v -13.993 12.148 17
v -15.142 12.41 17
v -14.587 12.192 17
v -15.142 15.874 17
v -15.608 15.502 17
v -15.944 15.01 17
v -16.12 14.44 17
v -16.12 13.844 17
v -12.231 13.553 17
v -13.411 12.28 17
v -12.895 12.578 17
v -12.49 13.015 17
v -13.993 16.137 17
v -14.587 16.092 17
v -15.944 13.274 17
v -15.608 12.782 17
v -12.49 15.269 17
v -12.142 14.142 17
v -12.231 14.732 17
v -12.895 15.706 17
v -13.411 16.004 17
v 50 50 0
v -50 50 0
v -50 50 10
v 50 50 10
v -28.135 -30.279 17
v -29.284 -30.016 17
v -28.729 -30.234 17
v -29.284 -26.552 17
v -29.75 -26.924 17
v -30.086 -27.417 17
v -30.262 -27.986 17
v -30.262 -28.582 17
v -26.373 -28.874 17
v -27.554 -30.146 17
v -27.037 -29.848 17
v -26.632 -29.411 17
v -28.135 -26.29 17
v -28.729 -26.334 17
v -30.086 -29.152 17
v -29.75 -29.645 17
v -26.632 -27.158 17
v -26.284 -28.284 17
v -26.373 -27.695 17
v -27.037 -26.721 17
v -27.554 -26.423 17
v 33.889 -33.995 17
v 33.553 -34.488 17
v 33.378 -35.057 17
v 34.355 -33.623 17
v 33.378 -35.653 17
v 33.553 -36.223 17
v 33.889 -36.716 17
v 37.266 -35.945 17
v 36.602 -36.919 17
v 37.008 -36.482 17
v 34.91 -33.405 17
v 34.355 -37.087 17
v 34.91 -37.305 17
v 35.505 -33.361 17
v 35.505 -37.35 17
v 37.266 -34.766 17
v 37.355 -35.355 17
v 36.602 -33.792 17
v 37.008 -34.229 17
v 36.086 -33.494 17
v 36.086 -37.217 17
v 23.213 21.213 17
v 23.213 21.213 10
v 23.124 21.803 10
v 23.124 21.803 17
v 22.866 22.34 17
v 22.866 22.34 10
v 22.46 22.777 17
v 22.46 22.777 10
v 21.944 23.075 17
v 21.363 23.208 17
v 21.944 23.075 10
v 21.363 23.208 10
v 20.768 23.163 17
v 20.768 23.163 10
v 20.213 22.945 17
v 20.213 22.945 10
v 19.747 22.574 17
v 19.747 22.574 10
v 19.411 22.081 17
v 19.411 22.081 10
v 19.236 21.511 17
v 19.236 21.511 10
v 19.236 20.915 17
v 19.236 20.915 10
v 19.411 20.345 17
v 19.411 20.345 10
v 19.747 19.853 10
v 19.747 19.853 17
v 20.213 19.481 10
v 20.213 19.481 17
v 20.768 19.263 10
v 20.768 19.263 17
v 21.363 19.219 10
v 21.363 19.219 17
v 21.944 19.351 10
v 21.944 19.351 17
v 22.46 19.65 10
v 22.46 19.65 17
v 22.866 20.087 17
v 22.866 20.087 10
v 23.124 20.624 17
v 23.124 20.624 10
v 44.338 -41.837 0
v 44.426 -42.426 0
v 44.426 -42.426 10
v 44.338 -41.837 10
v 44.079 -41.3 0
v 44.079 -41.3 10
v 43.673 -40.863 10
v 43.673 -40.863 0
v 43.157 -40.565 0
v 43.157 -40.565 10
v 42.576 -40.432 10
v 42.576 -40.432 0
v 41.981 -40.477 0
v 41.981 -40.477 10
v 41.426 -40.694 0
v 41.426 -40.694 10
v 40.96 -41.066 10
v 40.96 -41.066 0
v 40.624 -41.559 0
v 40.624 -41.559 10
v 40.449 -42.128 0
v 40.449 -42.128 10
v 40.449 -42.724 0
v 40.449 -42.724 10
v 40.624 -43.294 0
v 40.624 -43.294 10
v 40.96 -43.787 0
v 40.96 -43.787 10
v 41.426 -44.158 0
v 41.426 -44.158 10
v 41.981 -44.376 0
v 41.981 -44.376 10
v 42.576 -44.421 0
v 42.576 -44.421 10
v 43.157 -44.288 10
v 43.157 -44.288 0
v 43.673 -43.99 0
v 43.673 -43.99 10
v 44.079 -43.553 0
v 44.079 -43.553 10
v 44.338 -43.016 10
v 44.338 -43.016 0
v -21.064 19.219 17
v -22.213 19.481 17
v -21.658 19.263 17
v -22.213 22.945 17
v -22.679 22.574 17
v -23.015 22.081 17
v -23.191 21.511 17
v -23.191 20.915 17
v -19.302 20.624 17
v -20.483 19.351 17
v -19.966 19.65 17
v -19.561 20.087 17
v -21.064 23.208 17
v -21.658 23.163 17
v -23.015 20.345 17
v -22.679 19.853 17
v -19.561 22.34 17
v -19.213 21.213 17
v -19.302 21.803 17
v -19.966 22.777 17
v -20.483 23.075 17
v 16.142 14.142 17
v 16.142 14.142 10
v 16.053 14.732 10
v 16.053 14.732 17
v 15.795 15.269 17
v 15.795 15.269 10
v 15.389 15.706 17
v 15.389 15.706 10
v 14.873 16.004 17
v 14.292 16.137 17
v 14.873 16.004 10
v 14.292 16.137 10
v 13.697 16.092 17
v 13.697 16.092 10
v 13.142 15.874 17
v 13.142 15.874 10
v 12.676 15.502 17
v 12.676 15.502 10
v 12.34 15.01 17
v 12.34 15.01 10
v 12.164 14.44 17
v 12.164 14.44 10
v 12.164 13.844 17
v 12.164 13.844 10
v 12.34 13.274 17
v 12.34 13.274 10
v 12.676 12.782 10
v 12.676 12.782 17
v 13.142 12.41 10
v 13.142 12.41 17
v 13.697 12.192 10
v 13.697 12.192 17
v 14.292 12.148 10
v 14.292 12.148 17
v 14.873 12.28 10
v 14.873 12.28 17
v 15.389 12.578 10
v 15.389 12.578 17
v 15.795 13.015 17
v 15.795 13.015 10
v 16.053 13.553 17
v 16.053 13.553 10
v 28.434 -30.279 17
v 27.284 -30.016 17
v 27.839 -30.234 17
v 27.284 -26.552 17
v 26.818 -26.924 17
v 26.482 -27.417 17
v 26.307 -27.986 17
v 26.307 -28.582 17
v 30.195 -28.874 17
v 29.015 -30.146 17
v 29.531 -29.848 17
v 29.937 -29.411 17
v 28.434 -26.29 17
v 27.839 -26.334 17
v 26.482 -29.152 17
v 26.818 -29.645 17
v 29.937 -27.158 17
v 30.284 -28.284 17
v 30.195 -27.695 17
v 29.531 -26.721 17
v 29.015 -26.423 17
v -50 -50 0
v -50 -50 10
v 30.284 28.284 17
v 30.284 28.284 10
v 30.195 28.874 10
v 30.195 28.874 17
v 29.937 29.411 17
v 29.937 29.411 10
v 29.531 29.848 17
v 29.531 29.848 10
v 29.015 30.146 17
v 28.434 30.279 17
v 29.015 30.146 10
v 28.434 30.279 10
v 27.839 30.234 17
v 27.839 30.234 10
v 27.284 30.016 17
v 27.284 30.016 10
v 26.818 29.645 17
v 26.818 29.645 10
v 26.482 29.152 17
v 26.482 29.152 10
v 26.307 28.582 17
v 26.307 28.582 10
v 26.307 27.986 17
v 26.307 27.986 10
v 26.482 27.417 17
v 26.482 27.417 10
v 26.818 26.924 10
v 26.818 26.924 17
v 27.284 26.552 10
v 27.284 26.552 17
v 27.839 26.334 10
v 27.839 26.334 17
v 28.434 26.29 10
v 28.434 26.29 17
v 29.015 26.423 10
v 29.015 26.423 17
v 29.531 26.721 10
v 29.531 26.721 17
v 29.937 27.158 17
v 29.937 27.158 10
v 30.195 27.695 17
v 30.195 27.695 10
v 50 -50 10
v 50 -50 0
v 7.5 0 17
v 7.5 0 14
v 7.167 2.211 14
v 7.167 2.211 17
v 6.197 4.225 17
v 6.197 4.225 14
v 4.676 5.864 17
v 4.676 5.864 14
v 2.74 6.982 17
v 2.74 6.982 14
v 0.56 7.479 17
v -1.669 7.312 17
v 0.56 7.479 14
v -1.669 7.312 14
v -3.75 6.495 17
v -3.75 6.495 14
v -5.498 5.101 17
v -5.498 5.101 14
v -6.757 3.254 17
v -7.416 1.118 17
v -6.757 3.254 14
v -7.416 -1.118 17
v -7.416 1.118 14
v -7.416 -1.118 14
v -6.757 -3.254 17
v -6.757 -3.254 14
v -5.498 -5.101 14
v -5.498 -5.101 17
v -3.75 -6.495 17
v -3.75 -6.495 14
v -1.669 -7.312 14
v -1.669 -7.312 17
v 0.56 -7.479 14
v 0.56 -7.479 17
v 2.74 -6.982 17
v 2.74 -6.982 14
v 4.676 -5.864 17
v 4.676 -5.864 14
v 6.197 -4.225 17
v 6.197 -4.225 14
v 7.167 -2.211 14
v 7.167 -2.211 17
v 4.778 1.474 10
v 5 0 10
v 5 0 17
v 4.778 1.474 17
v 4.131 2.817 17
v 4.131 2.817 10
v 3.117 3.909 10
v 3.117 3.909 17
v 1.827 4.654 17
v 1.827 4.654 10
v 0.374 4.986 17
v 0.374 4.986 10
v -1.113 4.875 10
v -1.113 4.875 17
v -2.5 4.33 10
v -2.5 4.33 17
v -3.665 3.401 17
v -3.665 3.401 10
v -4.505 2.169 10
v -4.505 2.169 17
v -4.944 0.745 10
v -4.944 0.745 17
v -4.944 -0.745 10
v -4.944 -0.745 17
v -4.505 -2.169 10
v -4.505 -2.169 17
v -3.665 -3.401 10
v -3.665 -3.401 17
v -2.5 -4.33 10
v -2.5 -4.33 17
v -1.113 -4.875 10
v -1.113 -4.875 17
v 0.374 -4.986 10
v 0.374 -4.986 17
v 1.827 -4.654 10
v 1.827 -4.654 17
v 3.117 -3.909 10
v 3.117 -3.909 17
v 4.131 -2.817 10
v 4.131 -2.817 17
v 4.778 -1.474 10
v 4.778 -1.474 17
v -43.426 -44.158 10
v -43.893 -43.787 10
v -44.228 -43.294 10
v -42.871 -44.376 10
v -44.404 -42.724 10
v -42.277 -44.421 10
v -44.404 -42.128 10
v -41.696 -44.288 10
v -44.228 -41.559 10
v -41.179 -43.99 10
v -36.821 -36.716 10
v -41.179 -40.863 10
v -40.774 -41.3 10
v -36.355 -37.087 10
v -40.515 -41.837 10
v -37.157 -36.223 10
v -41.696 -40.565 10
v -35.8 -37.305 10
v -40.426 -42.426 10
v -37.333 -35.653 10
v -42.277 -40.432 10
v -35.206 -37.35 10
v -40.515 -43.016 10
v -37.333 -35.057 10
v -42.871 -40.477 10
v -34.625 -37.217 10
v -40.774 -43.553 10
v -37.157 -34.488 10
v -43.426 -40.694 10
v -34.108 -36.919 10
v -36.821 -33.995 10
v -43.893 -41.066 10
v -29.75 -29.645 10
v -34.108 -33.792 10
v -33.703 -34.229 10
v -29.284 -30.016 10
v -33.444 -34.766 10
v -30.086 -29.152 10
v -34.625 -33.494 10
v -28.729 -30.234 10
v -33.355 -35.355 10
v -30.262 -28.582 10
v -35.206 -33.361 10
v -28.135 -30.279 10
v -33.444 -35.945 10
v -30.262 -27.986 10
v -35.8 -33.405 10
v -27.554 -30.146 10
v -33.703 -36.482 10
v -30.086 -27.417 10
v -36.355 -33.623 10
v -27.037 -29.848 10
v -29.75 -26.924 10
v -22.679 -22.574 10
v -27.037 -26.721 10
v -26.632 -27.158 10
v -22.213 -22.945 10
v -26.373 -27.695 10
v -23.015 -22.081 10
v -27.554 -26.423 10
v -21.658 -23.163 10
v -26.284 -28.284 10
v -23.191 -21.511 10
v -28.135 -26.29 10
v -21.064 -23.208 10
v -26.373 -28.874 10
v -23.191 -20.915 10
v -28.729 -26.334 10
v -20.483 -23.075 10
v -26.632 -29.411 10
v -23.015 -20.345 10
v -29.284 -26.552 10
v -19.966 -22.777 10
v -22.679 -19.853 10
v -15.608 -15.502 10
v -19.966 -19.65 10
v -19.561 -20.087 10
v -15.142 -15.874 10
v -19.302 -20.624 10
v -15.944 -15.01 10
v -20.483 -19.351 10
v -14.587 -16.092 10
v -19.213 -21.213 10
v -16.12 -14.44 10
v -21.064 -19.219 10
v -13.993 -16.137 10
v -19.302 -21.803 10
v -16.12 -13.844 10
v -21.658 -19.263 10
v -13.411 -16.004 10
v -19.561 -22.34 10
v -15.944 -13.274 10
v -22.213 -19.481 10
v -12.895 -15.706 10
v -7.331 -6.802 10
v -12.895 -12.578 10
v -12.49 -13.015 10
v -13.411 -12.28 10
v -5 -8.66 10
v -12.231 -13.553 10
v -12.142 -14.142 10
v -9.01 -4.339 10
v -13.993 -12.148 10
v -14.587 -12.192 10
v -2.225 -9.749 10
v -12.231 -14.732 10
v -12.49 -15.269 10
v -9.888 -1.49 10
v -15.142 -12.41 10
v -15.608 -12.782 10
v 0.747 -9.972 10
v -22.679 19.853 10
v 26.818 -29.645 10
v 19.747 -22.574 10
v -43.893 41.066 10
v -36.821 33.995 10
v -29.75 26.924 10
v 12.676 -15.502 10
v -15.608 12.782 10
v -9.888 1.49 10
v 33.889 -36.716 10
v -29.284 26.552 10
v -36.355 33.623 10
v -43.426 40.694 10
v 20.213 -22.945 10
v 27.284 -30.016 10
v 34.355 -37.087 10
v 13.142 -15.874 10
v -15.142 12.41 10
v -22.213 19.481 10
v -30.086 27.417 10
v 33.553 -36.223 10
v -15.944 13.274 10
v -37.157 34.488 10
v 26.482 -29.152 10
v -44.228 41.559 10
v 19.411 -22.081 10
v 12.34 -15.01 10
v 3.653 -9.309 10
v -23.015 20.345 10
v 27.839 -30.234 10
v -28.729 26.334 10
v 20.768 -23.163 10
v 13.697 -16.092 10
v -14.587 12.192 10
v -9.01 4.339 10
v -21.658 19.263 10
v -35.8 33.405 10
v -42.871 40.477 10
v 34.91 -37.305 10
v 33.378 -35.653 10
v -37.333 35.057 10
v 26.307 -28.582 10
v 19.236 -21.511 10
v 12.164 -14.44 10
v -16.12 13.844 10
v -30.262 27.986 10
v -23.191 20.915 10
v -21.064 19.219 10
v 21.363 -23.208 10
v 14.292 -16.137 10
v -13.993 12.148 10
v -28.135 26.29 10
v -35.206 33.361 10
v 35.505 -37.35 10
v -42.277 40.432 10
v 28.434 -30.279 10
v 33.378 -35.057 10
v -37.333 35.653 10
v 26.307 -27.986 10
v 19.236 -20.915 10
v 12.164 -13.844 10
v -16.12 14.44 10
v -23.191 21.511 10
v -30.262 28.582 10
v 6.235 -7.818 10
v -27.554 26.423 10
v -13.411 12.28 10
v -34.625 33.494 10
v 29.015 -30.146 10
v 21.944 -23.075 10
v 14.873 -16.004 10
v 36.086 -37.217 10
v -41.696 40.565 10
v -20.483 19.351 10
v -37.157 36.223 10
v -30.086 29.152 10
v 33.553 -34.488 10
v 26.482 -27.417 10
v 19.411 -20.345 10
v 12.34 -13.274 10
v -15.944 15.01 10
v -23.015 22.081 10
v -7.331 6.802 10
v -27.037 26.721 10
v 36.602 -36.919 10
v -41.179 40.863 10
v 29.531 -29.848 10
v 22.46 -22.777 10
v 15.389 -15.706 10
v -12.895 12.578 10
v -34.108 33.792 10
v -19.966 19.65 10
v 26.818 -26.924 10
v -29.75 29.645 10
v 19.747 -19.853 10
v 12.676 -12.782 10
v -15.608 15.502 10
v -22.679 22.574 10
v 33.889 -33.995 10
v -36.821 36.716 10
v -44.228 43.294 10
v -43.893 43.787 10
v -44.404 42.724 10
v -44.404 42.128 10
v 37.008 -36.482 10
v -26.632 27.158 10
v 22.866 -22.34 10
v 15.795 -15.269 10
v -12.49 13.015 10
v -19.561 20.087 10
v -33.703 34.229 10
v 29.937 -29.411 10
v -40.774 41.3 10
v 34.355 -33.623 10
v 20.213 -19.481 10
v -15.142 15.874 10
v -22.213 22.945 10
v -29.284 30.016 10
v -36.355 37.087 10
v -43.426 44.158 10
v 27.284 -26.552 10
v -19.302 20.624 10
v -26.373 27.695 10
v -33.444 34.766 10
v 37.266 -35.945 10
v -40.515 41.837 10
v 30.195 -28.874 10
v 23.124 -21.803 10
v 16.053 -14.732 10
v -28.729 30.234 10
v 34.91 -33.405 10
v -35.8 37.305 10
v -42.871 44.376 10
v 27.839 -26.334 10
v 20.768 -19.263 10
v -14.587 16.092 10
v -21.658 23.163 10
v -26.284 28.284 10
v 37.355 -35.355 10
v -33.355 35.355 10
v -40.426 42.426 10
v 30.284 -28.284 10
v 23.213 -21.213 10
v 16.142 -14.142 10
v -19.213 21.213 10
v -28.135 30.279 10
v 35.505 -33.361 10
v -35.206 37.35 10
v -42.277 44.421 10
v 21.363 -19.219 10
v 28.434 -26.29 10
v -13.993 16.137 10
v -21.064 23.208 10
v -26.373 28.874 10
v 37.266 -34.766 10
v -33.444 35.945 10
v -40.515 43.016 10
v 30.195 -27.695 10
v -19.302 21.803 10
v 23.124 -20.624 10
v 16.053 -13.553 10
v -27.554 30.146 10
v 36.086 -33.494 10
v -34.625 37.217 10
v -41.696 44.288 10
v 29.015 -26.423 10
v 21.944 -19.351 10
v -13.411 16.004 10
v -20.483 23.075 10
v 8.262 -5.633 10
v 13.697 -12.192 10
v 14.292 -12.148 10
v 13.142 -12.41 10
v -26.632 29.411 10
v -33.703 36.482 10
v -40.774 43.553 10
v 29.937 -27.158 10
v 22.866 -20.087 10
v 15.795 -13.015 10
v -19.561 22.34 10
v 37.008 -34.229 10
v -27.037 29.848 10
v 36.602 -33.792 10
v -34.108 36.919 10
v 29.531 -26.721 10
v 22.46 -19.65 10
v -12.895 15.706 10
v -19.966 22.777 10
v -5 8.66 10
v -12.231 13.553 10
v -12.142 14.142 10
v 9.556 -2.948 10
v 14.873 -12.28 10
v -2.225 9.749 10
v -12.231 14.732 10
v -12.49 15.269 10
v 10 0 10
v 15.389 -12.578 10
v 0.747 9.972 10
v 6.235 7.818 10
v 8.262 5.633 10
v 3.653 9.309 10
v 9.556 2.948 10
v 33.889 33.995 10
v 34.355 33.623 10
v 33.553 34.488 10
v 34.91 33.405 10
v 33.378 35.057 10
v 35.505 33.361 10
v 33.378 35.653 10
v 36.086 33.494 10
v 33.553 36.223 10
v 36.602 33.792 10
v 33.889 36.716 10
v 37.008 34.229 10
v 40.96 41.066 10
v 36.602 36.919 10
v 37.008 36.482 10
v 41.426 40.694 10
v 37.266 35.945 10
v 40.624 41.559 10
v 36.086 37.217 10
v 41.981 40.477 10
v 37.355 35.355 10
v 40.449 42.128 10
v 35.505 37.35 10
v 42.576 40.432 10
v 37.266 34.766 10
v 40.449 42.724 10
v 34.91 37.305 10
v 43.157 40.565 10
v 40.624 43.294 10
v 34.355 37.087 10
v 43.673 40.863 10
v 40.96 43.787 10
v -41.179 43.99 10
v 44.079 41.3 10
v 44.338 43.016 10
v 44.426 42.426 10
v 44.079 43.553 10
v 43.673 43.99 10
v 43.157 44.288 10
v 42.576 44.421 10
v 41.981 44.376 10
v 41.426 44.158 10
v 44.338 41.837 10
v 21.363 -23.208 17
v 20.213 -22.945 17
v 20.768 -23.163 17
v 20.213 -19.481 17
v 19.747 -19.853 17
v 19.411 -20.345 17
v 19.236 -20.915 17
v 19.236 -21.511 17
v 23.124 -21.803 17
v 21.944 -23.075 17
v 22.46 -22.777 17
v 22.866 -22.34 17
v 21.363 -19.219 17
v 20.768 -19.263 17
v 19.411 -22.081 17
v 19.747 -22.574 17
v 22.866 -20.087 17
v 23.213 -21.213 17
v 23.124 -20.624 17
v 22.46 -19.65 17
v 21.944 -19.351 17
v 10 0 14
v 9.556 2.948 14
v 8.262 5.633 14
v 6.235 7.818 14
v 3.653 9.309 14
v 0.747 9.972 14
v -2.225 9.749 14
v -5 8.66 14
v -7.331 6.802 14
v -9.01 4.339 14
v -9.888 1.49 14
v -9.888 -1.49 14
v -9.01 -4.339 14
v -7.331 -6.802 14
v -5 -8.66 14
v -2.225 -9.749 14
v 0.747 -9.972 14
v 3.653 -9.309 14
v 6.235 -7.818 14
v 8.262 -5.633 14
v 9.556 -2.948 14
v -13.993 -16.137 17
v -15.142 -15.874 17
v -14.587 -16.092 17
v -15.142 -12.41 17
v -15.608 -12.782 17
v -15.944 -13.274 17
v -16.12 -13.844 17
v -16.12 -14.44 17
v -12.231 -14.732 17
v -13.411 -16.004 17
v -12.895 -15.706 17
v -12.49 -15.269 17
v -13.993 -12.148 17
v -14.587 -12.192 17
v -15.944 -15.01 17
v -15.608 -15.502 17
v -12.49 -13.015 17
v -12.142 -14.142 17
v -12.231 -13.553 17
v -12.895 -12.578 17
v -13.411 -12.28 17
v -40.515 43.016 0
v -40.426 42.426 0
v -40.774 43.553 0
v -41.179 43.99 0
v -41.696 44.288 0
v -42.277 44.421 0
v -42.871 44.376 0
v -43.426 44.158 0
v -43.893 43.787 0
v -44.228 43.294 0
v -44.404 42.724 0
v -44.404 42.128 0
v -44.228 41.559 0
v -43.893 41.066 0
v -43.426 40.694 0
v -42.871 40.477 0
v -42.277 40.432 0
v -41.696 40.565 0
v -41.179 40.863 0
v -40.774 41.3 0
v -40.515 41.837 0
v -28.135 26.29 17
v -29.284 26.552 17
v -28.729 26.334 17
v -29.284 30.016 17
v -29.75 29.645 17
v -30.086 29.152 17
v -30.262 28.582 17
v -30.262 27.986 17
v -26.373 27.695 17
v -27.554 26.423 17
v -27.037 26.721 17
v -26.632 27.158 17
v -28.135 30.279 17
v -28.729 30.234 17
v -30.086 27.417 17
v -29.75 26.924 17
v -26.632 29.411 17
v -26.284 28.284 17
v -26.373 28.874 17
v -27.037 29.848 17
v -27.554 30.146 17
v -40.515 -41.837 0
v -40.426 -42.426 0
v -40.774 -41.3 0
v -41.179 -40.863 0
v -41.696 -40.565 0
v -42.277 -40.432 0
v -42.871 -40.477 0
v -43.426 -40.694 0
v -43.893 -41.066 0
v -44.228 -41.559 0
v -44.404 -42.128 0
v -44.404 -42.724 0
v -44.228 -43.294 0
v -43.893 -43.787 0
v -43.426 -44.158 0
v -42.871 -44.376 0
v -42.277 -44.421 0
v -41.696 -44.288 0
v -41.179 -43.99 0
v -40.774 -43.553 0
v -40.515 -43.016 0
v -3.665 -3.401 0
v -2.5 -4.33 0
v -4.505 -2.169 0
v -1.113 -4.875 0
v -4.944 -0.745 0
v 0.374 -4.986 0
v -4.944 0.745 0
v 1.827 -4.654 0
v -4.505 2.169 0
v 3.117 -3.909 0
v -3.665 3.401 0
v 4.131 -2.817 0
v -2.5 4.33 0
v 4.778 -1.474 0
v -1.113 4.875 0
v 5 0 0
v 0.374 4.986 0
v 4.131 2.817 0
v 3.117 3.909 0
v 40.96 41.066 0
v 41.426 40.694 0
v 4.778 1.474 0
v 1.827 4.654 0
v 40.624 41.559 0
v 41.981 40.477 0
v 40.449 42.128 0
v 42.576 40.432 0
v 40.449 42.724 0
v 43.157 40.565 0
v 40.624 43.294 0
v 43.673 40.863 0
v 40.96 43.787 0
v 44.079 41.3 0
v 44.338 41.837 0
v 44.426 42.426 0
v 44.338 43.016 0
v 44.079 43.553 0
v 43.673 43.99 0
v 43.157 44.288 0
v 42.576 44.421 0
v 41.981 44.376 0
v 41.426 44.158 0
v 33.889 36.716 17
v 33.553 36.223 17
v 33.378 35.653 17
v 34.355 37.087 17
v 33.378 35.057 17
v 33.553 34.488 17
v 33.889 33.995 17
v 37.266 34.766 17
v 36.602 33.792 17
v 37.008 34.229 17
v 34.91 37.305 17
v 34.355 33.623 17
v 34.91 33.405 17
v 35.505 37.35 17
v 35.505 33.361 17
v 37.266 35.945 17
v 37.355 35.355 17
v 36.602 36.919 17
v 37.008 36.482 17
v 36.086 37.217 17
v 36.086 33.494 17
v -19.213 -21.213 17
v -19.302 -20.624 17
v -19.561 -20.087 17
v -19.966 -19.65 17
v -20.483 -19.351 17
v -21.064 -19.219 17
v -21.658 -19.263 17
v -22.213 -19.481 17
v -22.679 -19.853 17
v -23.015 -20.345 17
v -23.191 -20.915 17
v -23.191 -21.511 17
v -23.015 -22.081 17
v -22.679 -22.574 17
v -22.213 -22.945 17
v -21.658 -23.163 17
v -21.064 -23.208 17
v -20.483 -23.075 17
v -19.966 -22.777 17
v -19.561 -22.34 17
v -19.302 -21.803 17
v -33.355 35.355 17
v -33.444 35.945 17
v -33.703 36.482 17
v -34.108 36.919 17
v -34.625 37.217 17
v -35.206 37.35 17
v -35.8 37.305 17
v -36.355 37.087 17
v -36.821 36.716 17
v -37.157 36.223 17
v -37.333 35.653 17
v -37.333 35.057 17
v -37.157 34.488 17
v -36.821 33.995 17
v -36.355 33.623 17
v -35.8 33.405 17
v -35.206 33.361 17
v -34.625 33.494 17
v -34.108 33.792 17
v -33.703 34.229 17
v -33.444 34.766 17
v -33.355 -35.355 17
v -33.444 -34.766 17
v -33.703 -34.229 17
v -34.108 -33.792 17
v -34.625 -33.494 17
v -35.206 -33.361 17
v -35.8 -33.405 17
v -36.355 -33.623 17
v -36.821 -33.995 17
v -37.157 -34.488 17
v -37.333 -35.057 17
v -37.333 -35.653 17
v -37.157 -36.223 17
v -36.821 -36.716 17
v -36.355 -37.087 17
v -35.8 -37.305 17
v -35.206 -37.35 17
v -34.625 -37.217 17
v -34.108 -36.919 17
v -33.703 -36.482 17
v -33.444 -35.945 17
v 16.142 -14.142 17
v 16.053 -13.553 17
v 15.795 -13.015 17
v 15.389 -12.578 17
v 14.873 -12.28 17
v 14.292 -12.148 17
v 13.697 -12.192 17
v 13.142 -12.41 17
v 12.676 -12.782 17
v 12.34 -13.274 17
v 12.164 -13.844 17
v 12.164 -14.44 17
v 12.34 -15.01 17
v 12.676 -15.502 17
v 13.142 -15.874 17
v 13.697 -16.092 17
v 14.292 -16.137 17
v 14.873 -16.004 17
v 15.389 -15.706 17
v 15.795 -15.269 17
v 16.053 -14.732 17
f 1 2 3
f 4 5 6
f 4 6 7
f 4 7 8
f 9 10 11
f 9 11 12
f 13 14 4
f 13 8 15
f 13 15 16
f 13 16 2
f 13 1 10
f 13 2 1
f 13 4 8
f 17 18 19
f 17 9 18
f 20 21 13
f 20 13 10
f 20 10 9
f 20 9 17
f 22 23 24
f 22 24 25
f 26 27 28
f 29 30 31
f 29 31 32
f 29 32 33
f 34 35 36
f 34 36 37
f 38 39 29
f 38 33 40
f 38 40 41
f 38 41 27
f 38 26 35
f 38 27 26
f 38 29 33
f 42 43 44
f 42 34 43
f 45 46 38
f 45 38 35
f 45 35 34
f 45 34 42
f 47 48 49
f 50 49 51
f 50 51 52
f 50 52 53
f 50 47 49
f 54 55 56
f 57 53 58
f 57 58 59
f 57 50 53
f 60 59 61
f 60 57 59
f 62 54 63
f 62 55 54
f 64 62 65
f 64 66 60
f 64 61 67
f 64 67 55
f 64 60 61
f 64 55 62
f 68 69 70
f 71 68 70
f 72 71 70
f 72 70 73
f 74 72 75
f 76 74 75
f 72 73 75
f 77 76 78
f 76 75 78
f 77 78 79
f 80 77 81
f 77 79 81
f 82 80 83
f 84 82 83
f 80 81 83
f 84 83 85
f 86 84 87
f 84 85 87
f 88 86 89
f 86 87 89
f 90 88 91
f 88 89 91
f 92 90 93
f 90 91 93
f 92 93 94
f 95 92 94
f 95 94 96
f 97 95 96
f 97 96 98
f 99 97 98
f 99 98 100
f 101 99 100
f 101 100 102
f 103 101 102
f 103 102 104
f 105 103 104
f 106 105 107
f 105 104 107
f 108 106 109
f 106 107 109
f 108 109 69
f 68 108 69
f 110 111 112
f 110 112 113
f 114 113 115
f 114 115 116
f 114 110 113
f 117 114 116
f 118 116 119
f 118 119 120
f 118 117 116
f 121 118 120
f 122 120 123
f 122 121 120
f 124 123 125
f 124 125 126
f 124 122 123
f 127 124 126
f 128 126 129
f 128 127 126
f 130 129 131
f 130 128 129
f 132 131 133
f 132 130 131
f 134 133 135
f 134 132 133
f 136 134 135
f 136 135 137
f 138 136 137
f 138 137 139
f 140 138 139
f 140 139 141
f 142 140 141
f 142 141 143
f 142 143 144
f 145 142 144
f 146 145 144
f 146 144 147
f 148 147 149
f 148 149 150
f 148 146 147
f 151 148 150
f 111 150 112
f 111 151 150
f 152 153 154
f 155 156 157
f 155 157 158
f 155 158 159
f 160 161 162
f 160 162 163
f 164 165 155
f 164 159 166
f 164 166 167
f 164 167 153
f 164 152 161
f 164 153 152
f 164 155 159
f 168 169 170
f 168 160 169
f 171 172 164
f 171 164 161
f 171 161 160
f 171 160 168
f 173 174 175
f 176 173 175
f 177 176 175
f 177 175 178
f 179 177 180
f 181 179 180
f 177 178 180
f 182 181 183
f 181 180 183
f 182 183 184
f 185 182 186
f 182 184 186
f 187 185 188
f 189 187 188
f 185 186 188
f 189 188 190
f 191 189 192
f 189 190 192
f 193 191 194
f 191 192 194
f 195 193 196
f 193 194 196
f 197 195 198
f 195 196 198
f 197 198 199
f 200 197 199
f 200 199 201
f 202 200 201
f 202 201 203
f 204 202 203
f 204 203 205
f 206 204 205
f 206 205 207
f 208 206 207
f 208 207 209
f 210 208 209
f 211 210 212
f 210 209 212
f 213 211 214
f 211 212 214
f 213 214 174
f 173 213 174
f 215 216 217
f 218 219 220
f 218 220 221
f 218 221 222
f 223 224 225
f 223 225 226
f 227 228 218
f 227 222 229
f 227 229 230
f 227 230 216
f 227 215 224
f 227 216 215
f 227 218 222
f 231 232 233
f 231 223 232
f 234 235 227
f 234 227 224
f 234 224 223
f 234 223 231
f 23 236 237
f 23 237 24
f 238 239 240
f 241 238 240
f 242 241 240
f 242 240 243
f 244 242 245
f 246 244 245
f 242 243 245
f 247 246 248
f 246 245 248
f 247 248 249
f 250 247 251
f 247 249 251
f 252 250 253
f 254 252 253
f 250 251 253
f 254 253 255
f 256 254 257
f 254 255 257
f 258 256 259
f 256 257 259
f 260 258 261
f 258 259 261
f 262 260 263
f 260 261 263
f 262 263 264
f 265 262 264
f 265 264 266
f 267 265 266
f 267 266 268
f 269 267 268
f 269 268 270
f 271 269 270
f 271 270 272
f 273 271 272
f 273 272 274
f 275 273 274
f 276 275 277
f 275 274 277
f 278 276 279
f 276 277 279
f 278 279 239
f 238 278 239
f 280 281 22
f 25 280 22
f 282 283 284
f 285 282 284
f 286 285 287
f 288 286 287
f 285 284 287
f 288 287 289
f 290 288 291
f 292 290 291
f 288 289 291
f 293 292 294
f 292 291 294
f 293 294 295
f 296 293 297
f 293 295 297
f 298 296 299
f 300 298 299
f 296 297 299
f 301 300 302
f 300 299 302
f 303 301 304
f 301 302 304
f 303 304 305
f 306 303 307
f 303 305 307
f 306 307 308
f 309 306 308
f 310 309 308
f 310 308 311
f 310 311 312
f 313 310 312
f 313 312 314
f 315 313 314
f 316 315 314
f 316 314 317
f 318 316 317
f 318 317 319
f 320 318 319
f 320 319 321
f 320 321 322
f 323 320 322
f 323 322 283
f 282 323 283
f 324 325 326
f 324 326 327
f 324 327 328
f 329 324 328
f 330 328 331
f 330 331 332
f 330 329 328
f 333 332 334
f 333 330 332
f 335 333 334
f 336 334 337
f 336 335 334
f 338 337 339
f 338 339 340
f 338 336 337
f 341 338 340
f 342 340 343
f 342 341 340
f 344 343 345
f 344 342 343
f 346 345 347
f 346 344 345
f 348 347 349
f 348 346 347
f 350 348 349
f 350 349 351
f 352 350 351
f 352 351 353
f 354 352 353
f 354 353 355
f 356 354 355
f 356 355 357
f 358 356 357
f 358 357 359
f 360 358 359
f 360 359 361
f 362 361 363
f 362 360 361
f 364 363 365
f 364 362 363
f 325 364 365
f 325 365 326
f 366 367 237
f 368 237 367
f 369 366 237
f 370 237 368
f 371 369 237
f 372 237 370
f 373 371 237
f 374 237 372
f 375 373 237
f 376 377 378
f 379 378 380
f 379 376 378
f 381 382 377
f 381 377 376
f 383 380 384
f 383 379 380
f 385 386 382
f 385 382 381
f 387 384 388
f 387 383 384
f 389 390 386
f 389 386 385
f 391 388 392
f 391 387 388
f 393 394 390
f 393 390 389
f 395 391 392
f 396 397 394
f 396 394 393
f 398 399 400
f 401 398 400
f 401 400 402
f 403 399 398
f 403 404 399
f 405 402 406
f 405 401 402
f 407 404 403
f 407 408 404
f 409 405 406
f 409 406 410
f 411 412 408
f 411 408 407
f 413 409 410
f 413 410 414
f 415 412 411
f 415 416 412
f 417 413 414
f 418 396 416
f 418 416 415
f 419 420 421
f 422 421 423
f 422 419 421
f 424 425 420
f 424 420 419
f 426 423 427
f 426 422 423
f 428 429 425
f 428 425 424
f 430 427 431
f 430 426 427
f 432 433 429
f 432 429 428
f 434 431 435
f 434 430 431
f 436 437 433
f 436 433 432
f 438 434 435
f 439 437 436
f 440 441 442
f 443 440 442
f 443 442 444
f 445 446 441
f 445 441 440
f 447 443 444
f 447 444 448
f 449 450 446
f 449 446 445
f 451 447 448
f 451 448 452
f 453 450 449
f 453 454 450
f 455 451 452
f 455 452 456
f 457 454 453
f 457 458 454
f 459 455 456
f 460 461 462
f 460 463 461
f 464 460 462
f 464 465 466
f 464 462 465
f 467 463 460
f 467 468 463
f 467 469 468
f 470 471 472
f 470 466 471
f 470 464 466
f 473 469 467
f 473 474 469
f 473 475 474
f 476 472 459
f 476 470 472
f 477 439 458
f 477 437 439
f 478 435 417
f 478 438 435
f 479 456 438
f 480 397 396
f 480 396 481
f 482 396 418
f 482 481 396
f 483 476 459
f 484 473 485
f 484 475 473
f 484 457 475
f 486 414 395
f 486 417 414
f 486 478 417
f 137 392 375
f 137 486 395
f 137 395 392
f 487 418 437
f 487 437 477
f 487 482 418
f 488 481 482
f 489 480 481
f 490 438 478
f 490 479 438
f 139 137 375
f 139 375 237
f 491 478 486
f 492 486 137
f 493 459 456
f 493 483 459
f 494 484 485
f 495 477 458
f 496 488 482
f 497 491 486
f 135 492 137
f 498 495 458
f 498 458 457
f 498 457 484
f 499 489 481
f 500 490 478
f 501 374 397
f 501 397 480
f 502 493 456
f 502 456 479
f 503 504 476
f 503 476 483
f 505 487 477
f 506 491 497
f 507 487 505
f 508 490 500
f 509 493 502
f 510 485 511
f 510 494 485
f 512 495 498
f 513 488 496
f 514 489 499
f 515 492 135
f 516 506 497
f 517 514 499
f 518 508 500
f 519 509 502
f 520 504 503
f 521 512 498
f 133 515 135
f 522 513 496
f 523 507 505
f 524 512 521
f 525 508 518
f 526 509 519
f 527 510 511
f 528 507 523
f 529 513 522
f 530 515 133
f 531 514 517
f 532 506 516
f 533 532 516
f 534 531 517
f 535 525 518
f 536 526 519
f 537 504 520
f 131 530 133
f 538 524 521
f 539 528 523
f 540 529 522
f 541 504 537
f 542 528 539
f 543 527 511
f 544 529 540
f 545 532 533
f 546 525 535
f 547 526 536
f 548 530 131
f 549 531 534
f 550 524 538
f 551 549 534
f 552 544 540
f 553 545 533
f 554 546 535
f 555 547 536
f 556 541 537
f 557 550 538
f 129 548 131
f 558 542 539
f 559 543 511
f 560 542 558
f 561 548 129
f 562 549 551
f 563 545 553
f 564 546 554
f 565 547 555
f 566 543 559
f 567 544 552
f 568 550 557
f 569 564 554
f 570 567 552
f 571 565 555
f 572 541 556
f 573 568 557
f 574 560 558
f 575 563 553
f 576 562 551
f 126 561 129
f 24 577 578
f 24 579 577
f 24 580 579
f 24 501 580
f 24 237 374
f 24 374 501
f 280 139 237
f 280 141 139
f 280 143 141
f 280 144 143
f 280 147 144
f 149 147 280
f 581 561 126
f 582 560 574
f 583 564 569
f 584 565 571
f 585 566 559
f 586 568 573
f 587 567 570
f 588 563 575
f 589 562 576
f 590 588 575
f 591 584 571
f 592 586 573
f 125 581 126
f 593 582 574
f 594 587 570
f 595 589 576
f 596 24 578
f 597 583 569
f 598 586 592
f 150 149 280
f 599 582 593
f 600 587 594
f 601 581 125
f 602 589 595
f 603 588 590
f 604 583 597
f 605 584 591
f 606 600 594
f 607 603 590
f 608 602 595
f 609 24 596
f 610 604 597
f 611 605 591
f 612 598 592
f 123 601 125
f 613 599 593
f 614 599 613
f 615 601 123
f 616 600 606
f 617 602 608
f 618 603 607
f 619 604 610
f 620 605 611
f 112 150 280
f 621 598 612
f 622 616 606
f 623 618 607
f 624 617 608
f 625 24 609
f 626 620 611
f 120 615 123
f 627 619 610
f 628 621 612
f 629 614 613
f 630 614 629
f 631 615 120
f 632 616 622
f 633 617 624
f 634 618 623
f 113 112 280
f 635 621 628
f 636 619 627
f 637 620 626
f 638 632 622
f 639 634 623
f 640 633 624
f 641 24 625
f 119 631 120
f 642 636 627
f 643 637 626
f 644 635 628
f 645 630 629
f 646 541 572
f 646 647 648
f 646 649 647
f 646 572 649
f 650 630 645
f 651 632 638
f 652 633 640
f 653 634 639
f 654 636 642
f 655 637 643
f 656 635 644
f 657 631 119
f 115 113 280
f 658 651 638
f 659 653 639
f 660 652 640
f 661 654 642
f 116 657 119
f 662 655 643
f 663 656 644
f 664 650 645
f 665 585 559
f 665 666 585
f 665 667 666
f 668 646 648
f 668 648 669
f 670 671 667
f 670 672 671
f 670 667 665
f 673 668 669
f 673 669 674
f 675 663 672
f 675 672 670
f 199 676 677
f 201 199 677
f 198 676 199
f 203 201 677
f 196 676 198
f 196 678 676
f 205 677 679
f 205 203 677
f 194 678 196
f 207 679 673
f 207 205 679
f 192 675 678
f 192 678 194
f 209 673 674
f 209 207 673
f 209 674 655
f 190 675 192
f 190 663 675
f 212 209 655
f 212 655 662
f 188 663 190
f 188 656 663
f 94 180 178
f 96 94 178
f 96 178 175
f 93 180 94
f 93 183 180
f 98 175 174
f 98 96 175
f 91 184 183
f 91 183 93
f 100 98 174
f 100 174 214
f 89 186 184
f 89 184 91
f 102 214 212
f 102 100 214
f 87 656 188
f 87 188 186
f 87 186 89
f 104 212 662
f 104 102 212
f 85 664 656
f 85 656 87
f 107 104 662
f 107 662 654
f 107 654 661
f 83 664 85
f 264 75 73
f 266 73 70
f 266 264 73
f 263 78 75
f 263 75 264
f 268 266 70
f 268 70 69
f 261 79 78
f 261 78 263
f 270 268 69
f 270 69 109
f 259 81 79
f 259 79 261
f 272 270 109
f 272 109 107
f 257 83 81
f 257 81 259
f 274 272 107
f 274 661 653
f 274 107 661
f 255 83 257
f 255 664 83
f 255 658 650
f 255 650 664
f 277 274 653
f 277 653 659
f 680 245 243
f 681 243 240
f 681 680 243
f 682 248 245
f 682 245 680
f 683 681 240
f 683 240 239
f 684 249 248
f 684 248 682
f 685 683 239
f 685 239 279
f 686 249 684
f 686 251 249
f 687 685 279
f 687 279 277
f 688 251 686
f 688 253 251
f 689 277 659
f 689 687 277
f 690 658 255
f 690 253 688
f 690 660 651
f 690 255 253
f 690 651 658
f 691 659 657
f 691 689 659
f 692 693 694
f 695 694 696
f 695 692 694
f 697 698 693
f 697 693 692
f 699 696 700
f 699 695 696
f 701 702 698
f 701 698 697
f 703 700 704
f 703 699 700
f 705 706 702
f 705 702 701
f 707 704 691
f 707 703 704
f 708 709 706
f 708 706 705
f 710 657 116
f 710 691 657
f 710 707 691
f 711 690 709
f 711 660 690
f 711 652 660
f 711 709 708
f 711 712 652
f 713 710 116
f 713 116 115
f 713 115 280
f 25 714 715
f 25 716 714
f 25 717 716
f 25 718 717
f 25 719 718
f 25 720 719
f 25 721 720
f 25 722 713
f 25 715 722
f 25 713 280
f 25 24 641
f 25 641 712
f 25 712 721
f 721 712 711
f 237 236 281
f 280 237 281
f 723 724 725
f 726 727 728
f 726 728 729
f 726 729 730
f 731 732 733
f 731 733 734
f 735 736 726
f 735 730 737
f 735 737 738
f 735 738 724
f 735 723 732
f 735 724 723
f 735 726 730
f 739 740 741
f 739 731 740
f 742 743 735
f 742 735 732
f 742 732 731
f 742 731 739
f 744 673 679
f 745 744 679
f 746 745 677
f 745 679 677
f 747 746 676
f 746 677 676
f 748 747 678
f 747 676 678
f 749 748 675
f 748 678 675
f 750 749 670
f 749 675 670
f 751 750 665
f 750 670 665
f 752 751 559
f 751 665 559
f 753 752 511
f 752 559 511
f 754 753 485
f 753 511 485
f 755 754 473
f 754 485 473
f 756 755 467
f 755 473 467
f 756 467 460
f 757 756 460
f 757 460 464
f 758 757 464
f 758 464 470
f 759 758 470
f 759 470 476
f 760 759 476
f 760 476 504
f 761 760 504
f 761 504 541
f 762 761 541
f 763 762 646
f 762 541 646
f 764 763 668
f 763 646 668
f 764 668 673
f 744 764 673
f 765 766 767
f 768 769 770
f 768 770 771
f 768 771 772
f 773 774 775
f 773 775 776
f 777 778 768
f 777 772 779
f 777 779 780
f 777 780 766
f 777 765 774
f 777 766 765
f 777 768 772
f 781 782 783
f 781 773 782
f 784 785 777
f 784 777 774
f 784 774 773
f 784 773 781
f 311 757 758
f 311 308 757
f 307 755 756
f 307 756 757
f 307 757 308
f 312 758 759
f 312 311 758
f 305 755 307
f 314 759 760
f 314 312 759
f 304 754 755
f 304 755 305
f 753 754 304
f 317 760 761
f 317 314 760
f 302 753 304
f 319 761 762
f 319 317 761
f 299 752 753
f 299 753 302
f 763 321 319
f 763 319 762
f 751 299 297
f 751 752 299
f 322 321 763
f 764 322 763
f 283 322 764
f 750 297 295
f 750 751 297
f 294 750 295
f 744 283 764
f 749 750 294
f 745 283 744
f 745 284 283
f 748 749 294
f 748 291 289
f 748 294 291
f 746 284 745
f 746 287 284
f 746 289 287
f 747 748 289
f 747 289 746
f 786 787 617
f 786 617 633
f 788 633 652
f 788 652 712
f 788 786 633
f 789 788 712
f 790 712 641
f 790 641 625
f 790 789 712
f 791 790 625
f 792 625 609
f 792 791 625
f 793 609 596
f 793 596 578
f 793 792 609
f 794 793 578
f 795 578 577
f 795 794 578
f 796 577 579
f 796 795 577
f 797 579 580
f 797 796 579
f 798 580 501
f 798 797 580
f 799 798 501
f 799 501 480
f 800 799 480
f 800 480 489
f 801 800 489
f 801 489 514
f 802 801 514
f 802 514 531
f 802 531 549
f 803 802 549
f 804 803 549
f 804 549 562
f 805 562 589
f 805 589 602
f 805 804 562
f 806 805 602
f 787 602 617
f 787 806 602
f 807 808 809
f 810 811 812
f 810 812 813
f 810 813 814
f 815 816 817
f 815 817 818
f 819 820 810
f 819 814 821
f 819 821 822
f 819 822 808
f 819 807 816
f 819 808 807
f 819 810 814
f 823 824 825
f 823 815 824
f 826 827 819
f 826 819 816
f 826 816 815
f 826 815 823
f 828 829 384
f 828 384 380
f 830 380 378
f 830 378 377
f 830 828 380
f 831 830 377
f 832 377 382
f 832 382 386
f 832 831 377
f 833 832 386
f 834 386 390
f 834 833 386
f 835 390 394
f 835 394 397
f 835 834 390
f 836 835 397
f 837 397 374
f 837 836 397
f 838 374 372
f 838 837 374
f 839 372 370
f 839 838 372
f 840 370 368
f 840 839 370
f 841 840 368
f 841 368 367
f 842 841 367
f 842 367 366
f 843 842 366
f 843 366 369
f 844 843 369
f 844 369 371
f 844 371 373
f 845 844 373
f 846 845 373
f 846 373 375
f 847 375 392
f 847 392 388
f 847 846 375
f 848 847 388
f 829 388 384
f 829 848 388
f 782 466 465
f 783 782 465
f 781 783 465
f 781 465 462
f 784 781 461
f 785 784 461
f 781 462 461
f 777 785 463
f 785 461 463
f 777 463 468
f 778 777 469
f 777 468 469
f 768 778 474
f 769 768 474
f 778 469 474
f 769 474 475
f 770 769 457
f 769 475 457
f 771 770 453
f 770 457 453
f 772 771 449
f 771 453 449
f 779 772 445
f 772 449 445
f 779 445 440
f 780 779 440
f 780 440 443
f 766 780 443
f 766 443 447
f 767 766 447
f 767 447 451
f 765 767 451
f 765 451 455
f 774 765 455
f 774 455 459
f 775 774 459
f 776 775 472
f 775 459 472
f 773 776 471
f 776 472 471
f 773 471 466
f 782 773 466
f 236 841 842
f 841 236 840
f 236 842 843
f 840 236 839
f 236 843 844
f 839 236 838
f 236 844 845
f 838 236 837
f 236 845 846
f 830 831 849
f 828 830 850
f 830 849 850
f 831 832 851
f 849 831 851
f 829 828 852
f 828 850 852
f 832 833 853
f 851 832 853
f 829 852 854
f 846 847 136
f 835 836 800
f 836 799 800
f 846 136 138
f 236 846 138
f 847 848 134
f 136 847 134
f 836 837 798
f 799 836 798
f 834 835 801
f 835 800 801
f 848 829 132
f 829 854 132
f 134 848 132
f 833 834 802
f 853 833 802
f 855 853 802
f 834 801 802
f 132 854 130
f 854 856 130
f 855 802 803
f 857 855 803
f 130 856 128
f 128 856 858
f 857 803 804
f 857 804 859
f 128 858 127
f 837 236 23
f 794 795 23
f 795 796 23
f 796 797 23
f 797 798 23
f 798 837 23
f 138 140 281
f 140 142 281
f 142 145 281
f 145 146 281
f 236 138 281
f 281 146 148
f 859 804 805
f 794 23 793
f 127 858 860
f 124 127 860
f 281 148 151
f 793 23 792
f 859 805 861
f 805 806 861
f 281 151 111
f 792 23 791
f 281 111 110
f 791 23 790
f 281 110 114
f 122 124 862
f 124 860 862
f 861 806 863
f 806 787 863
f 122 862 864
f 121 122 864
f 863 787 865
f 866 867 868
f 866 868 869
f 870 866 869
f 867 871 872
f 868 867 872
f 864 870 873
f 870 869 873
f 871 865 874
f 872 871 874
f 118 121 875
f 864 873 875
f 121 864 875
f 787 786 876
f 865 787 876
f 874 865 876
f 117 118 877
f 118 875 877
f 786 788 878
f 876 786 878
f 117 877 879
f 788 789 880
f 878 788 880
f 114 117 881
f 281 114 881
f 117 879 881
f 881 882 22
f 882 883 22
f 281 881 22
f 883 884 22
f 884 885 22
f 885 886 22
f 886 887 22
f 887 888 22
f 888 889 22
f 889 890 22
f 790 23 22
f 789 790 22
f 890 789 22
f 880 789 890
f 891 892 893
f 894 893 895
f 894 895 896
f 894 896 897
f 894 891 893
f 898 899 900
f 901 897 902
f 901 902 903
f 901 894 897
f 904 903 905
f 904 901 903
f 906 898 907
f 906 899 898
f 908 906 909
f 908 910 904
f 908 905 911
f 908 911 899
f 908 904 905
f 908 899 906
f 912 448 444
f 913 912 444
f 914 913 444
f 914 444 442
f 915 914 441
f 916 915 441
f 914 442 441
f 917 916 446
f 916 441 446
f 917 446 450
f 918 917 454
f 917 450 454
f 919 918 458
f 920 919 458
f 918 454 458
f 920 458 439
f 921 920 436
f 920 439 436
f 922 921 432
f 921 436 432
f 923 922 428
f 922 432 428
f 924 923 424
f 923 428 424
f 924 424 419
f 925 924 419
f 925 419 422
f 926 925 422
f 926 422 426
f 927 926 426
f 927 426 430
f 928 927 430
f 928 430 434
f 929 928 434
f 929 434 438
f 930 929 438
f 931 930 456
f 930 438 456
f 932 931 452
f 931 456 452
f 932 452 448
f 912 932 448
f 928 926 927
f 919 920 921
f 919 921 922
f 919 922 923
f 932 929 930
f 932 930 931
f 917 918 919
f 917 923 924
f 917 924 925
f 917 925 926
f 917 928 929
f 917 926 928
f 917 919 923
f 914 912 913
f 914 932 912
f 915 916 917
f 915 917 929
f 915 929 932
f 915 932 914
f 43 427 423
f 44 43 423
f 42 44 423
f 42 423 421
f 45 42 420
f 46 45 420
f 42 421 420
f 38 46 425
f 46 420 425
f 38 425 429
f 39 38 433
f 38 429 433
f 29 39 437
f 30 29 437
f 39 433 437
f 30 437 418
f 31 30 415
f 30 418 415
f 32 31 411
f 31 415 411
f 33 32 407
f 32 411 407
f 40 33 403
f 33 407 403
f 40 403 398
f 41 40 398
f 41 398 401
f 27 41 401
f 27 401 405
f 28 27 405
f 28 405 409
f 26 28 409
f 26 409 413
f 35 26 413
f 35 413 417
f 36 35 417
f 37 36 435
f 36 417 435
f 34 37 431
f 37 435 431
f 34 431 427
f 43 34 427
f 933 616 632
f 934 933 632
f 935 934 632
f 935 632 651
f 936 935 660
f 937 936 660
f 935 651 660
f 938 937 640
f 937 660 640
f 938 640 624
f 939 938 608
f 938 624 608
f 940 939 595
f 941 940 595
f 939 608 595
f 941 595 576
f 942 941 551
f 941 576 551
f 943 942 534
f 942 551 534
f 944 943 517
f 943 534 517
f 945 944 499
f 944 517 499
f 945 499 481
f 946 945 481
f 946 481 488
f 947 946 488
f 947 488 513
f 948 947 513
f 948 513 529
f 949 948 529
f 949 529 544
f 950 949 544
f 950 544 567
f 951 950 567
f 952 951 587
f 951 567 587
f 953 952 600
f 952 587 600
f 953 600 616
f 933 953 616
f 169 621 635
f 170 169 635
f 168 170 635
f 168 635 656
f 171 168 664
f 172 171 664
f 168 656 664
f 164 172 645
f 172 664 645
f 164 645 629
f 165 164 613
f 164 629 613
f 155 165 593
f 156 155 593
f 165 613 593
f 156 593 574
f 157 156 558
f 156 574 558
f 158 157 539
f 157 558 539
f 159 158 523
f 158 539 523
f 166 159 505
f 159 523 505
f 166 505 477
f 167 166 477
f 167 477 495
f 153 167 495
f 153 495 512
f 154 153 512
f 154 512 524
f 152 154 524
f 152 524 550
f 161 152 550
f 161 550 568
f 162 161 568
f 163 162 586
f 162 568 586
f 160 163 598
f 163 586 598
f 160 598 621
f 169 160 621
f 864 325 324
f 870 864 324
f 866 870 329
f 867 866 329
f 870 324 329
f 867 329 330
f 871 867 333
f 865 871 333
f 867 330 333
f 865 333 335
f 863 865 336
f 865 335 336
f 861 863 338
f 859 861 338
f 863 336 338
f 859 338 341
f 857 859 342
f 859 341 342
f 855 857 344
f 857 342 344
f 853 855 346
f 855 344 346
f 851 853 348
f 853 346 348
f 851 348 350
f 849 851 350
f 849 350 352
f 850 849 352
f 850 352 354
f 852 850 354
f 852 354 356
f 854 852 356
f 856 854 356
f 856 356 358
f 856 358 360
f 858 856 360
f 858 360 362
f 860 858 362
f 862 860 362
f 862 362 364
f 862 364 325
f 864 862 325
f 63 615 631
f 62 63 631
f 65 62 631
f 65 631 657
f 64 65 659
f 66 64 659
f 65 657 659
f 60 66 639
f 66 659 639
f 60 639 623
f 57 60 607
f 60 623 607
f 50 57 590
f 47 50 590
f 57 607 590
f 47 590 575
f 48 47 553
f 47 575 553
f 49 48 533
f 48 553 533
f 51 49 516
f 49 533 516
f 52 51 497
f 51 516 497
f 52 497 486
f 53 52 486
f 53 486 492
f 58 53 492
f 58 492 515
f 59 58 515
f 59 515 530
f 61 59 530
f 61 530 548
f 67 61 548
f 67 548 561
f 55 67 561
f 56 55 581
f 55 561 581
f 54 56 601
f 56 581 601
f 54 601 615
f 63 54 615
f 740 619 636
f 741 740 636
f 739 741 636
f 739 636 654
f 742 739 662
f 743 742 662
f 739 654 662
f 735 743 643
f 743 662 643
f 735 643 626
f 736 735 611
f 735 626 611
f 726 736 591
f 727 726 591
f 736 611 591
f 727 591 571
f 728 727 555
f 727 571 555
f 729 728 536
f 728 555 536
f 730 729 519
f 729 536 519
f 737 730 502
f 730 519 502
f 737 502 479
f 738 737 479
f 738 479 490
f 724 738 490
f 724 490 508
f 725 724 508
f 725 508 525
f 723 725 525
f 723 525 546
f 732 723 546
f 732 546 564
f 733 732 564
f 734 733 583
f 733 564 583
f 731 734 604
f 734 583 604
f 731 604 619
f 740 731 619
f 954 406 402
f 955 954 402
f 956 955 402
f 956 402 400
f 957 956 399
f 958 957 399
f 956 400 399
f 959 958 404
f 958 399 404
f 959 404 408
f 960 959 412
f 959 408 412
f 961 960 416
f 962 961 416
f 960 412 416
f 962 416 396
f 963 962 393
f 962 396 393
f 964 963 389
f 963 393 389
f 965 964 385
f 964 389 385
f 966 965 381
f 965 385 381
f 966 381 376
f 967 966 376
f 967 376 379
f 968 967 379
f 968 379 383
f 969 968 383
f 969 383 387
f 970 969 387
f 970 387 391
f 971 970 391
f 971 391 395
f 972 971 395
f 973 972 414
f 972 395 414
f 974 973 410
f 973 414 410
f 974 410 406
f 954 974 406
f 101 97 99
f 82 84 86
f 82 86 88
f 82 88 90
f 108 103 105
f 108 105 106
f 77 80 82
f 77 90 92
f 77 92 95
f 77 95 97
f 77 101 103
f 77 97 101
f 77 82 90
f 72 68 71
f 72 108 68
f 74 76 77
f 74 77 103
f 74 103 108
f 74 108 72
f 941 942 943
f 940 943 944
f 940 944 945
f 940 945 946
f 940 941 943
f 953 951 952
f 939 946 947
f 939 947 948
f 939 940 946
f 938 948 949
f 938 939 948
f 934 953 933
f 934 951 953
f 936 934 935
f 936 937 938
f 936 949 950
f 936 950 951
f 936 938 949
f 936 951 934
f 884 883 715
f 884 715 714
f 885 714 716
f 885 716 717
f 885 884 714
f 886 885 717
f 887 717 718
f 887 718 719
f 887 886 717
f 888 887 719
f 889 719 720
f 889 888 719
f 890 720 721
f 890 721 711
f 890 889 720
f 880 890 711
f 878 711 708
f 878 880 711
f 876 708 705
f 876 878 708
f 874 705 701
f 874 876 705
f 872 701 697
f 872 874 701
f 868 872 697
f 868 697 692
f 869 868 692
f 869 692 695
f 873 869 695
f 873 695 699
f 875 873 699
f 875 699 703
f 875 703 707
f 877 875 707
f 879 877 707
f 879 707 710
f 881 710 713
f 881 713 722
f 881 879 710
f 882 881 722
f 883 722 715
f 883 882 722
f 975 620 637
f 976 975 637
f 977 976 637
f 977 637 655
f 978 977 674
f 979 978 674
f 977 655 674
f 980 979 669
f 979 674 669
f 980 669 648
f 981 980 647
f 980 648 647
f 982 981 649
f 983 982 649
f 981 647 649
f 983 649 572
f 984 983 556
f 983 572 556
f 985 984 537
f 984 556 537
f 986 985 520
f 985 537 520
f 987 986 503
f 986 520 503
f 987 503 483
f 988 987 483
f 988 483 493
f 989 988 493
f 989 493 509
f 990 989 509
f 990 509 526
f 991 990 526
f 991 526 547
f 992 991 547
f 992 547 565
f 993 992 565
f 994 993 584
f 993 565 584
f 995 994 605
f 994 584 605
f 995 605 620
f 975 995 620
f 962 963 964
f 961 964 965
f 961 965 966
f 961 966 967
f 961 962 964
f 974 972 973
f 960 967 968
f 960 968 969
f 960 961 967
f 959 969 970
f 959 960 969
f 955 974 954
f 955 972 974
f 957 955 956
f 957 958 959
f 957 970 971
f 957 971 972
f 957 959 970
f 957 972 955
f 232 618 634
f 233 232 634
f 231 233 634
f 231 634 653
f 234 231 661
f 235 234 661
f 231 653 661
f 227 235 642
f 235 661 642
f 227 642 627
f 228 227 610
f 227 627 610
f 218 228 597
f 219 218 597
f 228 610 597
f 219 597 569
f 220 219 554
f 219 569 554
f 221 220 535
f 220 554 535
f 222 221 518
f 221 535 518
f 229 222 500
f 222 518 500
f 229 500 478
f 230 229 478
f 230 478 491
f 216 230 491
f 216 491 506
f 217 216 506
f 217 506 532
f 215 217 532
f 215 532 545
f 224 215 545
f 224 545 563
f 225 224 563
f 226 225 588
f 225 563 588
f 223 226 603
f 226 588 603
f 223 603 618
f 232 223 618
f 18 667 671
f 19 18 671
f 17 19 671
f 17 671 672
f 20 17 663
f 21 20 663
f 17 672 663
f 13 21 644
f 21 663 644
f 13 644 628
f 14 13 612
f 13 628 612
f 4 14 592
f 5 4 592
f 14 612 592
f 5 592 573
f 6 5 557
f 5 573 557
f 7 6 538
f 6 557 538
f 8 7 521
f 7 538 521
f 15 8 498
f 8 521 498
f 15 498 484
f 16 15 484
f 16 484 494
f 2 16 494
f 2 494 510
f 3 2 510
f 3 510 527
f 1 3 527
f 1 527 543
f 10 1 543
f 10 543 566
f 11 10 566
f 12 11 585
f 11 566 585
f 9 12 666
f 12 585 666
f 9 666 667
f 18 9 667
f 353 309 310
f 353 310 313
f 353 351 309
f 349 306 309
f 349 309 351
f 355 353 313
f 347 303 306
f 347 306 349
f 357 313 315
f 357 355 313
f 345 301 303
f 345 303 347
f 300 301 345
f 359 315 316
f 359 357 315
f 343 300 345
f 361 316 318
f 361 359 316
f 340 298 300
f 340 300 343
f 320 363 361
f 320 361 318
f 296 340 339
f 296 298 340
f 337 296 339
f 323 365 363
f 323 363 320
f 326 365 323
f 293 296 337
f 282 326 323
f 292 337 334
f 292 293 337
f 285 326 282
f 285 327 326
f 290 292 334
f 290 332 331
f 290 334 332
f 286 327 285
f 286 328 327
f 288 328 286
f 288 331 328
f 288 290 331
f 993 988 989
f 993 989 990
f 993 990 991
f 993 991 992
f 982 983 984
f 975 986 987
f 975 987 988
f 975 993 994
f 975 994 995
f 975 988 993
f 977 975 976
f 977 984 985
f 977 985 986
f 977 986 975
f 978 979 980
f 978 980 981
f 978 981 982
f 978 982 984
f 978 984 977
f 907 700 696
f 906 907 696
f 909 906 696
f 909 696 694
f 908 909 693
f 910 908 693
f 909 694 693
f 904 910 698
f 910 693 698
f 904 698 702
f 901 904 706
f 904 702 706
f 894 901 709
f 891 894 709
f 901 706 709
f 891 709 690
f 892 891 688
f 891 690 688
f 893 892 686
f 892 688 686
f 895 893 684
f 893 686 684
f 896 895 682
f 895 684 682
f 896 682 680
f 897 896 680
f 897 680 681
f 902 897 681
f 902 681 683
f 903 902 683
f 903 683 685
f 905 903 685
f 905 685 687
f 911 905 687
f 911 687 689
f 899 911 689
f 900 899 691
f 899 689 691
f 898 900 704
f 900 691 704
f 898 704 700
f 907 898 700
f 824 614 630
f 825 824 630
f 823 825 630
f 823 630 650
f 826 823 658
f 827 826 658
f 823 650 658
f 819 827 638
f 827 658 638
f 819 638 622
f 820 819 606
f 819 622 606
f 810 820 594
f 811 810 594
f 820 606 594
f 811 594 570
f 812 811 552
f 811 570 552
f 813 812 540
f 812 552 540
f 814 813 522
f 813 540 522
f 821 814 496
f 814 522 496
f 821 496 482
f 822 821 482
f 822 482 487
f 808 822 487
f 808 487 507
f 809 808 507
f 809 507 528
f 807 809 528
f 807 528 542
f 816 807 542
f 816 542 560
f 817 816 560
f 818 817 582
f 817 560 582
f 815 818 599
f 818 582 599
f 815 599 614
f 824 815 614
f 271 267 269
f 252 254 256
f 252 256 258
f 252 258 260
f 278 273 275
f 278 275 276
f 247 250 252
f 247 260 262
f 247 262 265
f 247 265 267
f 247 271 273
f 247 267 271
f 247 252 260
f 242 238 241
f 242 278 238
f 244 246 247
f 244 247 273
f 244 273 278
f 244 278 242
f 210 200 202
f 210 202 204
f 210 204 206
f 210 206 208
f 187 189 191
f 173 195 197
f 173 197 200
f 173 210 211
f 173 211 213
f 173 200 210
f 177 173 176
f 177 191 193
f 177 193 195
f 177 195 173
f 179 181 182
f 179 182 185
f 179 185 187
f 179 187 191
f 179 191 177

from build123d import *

# Parameters (mm, degrees)
F0_W     = 100
F0_H     = 100
F0_R     = 2
F1_DEPTH = 10
F2_R     = 2
F3_DEPTH = 7
F4_R     = 10
F4_R_2   = 7.5
F5_DEPTH = 4
F4_R_3   = 5
F6_DEPTH = 7
F7_DEPTH = 25


with BuildPart() as f1:
    # F0 (on Top) → F1 (new body)
    with BuildSketch(Plane.XY):
        Rectangle(F0_W, F0_H)
        with Locations((-42.426407, -42.426407)):
            Circle(F0_R, mode=Mode.SUBTRACT)
        with Locations((42.426407, -42.426407)):
            Circle(F0_R, mode=Mode.SUBTRACT)
        with Locations((-42.426407, 42.426407)):
            Circle(F0_R, mode=Mode.SUBTRACT)
        with Locations((42.426407, 42.426407)):
            Circle(F0_R, mode=Mode.SUBTRACT)
    extrude(amount=F1_DEPTH)

    # F2 (on face) → F3 (join)
    with BuildSketch(Plane.XY.offset(10)):
        with Locations((14.142136, -14.142136)):
            Circle(F2_R)
        with Locations((21.213203, -21.213203)):
            Circle(F2_R)
        with Locations((28.284271, -28.284271)):
            Circle(F2_R)
        with Locations((35.355339, -35.355339)):
            Circle(F2_R)
        with Locations((14.142136, 14.142136)):
            Circle(F2_R)
        with Locations((21.213203, 21.213203)):
            Circle(F2_R)
        with Locations((28.284271, 28.284271)):
            Circle(F2_R)
        with Locations((35.355339, 35.355339)):
            Circle(F2_R)
        with Locations((-14.142136, 14.142136)):
            Circle(F2_R)
        with Locations((-21.213203, 21.213203)):
            Circle(F2_R)
        with Locations((-28.284271, 28.284271)):
            Circle(F2_R)
        with Locations((-35.355339, 35.355339)):
            Circle(F2_R)
        with Locations((-14.142136, -14.142136)):
            Circle(F2_R)
        with Locations((-21.213203, -21.213203)):
            Circle(F2_R)
        with Locations((-28.284271, -28.284271)):
            Circle(F2_R)
        with Locations((-35.355339, -35.355339)):
            Circle(F2_R)
    extrude(amount=F3_DEPTH)

    # F4 (on face) → F5 (join)
    with BuildSketch(Plane.XY.offset(10)):
        Circle(F4_R)
        Circle(F4_R_2, mode=Mode.SUBTRACT)
    extrude(amount=F5_DEPTH)

    # F4 (on face) → F6 (join)
    with BuildSketch(Plane.XY.offset(10)):
        Circle(F4_R_2)
        Circle(F4_R_3, mode=Mode.SUBTRACT)
    extrude(amount=F6_DEPTH)

    # F4 (on face) → F7 (cut)
    with BuildSketch(Plane.XY.offset(10)):
        Circle(F4_R_3)
    extrude(amount=-F7_DEPTH, mode=Mode.SUBTRACT)


solid = f1.part
